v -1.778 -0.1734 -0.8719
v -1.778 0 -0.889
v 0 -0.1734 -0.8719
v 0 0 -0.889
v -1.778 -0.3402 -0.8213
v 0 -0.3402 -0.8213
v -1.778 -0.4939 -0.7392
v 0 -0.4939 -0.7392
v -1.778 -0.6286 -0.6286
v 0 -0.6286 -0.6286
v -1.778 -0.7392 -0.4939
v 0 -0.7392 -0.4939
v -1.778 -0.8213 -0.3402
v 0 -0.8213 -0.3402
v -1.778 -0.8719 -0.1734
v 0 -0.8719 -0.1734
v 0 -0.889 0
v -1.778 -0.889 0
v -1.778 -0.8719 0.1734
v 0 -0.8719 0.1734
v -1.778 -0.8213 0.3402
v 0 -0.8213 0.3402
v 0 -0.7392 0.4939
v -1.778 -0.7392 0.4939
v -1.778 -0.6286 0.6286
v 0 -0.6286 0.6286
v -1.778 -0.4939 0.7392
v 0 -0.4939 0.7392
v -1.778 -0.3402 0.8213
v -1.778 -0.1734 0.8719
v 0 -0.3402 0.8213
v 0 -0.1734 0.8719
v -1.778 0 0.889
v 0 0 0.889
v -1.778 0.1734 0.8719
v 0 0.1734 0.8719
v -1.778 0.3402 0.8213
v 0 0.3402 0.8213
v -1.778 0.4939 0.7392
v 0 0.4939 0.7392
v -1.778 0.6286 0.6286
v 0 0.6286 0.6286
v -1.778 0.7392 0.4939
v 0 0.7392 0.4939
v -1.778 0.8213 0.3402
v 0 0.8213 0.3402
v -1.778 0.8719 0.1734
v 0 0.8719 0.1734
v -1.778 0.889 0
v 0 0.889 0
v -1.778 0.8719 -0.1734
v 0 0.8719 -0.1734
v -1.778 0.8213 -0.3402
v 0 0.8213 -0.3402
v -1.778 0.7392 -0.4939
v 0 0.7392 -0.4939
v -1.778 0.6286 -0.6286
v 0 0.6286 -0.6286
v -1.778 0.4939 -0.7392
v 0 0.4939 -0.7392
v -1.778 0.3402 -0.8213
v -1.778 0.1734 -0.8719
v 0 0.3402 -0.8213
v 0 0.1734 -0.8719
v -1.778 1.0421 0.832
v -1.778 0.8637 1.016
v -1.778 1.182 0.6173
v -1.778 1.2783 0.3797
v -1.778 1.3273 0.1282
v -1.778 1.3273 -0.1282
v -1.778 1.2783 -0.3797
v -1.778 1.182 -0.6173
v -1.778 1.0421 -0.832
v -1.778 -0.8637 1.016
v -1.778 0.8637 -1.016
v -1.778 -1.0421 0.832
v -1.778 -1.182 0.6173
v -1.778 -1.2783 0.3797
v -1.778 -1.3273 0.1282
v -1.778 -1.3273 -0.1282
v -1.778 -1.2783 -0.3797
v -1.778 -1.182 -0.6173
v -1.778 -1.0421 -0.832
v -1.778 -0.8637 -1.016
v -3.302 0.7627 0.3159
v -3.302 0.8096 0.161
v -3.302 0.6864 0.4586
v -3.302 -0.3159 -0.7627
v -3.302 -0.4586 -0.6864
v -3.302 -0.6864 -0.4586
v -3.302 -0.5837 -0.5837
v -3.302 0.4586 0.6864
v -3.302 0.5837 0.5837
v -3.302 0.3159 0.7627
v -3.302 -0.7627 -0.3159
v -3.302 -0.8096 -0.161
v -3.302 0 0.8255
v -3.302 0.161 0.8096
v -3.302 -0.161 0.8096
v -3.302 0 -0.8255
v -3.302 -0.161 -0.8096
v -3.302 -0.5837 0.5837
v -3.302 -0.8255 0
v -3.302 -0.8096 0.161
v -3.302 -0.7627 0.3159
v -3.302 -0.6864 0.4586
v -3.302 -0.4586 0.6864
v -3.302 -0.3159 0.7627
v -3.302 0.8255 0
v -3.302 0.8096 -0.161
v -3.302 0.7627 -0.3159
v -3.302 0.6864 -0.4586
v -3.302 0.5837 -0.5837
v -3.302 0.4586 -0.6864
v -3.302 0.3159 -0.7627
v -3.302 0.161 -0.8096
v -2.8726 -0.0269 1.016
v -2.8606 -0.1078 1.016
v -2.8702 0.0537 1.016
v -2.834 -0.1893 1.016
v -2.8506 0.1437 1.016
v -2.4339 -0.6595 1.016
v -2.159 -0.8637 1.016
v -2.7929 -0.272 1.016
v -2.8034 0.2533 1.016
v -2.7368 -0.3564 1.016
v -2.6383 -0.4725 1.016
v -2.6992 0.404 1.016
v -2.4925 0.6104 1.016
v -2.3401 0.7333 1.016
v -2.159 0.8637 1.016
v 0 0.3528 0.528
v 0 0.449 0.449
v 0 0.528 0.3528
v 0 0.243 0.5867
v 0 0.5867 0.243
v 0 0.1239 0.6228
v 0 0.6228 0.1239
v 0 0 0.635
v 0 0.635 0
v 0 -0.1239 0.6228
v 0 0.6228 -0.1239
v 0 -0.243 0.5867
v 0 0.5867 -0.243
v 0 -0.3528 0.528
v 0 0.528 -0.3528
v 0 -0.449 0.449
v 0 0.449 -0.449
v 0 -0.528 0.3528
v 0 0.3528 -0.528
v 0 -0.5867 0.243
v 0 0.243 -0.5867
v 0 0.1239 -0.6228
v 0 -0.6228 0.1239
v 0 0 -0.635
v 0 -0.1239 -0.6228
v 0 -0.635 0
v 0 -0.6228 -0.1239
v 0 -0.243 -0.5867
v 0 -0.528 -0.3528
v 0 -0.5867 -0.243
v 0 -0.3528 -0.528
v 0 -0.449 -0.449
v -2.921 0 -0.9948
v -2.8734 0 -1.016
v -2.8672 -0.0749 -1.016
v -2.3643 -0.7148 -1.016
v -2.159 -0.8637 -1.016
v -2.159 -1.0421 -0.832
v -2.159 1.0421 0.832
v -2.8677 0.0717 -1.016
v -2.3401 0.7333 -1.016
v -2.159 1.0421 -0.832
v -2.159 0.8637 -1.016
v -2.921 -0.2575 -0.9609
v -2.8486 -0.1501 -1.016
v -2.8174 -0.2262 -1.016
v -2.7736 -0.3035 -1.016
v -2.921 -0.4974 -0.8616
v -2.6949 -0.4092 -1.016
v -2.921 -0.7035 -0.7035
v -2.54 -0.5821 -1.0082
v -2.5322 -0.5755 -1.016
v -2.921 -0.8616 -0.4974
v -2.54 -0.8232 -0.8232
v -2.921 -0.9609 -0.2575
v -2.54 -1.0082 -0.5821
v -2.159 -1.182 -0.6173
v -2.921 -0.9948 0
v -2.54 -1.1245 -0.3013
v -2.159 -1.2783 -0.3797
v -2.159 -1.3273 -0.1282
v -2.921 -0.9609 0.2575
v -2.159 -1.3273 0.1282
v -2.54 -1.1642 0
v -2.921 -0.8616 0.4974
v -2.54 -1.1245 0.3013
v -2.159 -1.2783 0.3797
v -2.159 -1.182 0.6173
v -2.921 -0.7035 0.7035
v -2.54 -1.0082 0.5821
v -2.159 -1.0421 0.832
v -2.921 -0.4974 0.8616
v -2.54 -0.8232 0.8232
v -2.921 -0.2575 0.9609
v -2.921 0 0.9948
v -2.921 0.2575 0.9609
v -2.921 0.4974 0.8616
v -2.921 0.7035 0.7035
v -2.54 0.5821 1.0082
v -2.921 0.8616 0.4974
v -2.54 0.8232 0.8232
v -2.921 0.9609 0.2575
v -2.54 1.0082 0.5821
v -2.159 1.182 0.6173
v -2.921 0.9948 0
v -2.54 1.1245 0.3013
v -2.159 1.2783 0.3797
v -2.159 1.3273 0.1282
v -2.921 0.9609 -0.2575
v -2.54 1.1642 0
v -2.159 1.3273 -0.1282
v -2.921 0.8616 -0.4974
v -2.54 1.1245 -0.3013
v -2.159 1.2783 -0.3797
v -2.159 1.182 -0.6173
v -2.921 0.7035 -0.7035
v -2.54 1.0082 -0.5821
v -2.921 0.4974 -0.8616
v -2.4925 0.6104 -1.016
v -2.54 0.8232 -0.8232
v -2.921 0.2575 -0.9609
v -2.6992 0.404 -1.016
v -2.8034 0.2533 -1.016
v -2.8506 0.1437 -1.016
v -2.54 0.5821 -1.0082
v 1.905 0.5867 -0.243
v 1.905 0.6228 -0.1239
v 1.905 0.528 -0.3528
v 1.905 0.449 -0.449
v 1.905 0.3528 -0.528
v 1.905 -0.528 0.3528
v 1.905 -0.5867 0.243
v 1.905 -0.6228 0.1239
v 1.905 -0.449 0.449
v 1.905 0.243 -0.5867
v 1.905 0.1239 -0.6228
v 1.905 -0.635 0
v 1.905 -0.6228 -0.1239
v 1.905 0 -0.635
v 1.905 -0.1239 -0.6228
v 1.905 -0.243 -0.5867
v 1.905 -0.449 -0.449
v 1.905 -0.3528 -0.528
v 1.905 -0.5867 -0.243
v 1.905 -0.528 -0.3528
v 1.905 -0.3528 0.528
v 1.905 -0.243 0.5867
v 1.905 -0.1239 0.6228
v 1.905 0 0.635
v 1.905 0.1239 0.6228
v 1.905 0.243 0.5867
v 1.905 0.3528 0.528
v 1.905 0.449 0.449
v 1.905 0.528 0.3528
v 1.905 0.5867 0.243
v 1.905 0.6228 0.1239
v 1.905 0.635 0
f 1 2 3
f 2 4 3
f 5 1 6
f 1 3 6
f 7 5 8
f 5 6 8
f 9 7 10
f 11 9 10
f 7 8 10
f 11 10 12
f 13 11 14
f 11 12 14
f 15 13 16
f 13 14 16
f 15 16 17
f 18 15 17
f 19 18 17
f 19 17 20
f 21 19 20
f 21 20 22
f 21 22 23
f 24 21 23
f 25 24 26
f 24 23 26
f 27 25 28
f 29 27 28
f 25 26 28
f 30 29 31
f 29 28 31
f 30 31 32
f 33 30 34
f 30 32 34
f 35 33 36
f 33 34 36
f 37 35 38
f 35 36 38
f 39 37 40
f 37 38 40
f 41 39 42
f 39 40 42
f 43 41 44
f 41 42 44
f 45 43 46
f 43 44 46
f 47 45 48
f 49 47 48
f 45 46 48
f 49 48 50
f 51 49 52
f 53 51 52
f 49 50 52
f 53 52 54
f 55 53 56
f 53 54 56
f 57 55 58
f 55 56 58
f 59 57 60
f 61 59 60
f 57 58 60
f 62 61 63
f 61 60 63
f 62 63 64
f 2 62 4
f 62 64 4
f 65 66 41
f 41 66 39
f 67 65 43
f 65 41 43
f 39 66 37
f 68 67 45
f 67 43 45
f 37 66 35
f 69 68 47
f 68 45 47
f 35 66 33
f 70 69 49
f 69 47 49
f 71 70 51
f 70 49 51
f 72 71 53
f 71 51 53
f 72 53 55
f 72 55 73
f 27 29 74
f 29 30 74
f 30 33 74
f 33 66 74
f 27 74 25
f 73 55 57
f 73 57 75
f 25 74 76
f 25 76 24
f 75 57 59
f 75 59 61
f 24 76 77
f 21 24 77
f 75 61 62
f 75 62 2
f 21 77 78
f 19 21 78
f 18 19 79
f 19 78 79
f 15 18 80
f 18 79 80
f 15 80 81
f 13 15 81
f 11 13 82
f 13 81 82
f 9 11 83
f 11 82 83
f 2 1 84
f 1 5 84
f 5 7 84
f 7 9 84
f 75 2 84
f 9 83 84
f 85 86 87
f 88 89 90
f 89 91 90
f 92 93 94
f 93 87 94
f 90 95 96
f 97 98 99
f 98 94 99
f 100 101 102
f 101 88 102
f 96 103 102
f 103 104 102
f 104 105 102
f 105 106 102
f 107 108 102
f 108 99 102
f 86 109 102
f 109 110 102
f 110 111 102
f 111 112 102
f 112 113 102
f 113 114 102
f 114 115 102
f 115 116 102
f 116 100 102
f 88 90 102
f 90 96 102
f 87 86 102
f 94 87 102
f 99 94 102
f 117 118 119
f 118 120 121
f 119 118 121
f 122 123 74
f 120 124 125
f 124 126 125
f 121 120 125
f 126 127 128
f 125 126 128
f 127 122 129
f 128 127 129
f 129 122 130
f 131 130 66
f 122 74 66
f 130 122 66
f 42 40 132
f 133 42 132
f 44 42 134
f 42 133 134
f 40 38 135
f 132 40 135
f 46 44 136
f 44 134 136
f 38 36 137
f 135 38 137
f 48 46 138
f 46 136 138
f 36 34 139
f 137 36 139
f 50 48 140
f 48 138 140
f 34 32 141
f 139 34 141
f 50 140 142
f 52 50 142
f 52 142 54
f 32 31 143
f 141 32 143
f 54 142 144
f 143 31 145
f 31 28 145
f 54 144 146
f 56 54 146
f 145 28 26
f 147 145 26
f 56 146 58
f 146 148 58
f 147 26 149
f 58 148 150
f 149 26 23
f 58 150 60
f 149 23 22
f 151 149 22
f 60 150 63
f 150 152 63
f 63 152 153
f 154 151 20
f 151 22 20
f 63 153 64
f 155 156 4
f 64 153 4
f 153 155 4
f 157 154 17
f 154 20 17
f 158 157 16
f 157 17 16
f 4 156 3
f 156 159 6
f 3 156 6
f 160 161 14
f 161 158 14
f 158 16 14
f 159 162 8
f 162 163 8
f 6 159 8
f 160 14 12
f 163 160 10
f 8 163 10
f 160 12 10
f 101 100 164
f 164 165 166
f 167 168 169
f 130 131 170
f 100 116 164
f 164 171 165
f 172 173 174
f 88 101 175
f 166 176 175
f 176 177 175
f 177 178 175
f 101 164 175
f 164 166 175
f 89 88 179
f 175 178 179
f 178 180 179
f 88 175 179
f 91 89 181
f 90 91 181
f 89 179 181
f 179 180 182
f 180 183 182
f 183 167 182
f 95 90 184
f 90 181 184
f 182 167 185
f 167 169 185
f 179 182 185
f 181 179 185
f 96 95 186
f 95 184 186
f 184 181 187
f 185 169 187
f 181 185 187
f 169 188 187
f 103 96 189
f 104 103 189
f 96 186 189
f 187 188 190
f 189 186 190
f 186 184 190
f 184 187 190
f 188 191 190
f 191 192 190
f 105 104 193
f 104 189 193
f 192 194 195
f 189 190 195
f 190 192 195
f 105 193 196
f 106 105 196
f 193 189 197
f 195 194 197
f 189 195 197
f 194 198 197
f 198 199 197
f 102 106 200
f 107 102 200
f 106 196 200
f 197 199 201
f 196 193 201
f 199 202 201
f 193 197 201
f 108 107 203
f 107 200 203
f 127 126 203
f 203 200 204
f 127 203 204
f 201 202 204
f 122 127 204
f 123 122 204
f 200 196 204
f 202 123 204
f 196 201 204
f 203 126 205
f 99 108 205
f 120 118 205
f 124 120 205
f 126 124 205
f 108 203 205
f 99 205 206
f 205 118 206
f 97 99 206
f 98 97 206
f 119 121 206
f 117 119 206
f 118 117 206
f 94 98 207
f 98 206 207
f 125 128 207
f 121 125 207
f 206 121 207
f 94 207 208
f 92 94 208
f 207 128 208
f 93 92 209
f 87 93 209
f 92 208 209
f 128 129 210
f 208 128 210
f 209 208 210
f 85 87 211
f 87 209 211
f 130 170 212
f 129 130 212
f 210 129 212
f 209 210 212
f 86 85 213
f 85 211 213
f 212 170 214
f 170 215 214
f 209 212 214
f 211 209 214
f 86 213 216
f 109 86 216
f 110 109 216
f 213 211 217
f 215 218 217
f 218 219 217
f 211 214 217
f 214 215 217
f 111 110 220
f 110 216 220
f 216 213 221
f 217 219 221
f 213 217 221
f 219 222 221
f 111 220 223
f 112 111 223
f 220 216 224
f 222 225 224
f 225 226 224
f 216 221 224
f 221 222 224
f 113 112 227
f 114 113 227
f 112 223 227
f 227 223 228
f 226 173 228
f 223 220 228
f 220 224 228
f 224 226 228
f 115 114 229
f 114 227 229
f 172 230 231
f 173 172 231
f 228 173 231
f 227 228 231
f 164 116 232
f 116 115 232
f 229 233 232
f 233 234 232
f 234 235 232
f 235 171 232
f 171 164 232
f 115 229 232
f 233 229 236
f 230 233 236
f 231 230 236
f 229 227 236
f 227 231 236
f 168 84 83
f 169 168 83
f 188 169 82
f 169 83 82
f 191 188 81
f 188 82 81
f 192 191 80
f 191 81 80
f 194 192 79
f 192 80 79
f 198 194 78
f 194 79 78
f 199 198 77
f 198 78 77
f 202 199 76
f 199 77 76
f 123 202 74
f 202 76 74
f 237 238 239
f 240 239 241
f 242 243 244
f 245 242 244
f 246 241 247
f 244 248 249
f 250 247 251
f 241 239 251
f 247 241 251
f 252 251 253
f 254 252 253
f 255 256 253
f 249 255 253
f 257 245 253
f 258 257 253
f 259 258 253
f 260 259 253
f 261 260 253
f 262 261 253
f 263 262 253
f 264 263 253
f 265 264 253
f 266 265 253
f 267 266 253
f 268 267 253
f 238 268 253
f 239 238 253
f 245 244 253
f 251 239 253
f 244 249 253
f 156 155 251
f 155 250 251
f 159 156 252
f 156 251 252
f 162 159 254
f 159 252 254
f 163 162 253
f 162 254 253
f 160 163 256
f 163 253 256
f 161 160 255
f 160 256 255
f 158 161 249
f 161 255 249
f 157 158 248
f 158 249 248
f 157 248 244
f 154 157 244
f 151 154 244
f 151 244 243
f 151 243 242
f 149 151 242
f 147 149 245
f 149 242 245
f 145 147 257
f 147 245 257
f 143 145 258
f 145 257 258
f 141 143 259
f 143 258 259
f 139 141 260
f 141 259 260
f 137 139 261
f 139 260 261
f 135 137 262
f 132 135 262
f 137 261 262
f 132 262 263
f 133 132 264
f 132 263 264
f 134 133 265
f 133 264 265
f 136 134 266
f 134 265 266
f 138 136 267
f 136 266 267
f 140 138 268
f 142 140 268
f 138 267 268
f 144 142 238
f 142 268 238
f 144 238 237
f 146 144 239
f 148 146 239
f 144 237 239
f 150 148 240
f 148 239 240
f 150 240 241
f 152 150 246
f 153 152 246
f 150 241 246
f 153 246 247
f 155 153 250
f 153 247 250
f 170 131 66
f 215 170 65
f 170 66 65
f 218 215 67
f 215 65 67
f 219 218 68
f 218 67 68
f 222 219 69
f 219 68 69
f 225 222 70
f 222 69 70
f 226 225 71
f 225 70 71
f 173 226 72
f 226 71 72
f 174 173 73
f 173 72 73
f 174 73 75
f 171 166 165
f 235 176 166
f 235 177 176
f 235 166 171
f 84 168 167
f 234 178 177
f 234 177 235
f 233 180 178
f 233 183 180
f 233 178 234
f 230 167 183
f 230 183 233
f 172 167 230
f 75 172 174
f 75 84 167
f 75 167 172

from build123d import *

# Parameters (mm, degrees)
SKETCH2_W          = 0.562344702
SKETCH2_H          = 2.292150926
CUT_EXTRUDE1_DEPTH = 5.137744978


with BuildPart() as part:
    # Sketch1 → Revolve1 (revolve)
    with BuildSketch(Plane.XY, mode=Mode.PRIVATE) as revolve1_sk:
        Polygon((-1.778, 0.889), (0, 0.889), (0, 0.635), (1.905, 0.635), (1.905, 0), (-3.302, 0), (-3.302, 0.8255), (-2.159, 1.3335), (-1.778, 1.3335), align=None)
    revolve(revolve1_sk.sketch.rotate(Axis((0, 0, 0), (-1, 0, 0)), 90), axis=Axis((0, 0, 0), (-1, 0, 0)))

    # Sketch2 → Cut-Extrude1 (cut, through all)
    with BuildSketch(Plane(origin=(-1.778, 0, 0), x_dir=(0, 0, -1), z_dir=(1, 0, 0))):
        with Locations((-1.297172351, -0.075001494)):
            Rectangle(SKETCH2_W, SKETCH2_H)
        with Locations((1.297172351, -0.075001494)):
            Rectangle(SKETCH2_W, SKETCH2_H)
    extrude(amount=-CUT_EXTRUDE1_DEPTH, mode=Mode.SUBTRACT)


solid = part.part
